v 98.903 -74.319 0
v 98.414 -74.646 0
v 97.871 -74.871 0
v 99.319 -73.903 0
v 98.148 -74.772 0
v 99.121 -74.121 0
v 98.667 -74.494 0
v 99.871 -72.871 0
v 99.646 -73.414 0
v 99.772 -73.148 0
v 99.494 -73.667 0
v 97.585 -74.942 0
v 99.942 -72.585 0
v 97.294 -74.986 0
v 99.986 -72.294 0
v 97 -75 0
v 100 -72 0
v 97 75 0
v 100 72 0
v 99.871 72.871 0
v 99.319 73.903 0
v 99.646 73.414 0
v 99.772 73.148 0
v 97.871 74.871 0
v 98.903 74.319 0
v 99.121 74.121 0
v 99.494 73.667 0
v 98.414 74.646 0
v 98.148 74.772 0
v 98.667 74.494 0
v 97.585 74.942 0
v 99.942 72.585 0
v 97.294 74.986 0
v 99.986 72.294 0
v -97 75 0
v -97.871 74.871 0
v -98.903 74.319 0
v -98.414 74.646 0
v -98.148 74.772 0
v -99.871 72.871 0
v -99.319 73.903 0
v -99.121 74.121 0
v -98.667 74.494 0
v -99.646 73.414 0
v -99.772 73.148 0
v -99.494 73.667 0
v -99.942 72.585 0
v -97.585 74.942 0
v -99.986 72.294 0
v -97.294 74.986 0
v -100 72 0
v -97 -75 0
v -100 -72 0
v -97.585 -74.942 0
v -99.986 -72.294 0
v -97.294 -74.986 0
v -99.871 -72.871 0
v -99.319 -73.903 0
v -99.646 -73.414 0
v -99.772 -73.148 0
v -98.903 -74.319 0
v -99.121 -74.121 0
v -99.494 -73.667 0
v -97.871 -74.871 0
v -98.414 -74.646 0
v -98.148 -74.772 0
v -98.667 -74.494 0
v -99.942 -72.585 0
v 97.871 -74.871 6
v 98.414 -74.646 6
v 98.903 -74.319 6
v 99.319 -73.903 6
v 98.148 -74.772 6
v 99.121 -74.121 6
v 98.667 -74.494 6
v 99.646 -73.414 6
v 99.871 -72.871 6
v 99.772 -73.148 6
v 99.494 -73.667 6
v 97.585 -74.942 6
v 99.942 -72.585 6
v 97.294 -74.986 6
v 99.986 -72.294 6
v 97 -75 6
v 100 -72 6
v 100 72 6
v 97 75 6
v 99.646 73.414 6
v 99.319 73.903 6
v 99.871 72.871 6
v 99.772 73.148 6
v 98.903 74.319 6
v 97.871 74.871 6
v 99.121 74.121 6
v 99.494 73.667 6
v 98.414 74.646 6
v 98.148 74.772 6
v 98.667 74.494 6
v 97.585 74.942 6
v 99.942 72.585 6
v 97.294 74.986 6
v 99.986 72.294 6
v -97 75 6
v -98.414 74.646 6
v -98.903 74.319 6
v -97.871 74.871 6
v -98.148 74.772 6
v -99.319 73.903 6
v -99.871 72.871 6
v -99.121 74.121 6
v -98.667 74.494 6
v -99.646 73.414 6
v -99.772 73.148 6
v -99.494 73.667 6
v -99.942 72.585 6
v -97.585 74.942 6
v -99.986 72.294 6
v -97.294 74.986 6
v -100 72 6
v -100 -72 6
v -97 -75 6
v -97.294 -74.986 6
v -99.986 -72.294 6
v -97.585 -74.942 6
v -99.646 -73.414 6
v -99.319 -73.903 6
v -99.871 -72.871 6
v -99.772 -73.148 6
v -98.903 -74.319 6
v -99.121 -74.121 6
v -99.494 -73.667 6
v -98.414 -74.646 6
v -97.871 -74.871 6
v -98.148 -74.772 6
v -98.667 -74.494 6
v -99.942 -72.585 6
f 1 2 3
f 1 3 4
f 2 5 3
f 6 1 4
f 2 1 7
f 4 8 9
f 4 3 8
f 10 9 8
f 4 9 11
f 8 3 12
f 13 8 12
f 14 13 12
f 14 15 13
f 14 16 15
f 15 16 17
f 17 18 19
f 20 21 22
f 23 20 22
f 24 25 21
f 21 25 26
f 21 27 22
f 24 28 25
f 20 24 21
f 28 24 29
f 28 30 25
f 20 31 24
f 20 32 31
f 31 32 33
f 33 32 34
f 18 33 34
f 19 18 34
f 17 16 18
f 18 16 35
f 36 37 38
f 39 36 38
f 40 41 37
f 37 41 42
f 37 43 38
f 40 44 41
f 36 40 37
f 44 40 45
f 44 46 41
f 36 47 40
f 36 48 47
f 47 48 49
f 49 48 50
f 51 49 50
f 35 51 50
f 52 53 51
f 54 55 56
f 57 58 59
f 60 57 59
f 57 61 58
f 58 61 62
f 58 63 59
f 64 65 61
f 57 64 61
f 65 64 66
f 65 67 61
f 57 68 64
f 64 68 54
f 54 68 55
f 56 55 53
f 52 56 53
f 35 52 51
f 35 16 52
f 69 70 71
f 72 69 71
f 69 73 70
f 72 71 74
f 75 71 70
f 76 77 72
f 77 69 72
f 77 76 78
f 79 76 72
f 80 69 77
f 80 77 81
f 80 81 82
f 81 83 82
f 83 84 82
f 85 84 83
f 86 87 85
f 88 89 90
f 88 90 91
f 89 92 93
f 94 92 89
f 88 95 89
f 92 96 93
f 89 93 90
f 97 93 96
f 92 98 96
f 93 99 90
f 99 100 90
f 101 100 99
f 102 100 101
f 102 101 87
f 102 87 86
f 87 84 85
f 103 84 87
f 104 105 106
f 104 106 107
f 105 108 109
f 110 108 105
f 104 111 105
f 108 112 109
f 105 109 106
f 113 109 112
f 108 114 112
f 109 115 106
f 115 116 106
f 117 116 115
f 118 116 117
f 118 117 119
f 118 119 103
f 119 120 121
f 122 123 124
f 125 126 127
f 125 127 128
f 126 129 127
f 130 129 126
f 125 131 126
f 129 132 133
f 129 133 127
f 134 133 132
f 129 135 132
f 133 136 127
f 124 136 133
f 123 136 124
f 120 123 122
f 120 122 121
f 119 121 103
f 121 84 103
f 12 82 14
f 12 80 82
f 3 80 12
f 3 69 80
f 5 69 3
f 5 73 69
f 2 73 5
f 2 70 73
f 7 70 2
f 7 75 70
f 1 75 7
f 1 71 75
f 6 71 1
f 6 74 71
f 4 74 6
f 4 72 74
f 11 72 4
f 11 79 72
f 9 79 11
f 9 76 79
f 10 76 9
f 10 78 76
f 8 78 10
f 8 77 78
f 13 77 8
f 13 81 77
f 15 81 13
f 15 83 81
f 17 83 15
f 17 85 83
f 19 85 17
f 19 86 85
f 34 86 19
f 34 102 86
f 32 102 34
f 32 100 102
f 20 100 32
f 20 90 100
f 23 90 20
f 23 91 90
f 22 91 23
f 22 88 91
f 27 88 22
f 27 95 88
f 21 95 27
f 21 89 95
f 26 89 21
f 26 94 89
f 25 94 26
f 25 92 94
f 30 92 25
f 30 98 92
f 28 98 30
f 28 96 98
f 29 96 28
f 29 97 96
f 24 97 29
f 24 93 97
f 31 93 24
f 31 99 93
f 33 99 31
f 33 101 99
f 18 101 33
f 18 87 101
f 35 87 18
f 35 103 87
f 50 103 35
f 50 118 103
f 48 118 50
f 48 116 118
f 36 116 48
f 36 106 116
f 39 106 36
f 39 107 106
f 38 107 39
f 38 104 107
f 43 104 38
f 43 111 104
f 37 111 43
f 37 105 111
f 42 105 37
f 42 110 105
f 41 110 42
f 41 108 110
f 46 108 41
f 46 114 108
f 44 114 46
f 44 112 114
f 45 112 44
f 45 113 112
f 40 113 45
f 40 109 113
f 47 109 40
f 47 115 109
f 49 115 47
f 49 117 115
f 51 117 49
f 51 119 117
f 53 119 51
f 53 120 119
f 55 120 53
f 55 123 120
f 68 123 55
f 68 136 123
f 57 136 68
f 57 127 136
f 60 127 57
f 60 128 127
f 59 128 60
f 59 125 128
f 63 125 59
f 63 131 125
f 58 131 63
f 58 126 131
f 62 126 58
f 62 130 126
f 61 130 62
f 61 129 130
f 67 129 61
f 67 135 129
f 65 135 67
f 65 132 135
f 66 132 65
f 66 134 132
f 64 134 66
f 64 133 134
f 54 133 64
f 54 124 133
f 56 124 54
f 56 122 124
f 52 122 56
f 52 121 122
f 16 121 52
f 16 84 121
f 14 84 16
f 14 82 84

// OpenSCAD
$fn = 64;

length = 200;
width  = 150;
thickness = 6;

corner_radius = 3;

module rounded_plate(l, w, t, r){
    r2 = min(r, l/2, w/2);
    linear_extrude(height = t)
        offset(r = r2)
            square([l - 2*r2, w - 2*r2], center = true);
}

color([0.75, 0.77, 0.80])
    rounded_plate(length, width, thickness, corner_radius);
